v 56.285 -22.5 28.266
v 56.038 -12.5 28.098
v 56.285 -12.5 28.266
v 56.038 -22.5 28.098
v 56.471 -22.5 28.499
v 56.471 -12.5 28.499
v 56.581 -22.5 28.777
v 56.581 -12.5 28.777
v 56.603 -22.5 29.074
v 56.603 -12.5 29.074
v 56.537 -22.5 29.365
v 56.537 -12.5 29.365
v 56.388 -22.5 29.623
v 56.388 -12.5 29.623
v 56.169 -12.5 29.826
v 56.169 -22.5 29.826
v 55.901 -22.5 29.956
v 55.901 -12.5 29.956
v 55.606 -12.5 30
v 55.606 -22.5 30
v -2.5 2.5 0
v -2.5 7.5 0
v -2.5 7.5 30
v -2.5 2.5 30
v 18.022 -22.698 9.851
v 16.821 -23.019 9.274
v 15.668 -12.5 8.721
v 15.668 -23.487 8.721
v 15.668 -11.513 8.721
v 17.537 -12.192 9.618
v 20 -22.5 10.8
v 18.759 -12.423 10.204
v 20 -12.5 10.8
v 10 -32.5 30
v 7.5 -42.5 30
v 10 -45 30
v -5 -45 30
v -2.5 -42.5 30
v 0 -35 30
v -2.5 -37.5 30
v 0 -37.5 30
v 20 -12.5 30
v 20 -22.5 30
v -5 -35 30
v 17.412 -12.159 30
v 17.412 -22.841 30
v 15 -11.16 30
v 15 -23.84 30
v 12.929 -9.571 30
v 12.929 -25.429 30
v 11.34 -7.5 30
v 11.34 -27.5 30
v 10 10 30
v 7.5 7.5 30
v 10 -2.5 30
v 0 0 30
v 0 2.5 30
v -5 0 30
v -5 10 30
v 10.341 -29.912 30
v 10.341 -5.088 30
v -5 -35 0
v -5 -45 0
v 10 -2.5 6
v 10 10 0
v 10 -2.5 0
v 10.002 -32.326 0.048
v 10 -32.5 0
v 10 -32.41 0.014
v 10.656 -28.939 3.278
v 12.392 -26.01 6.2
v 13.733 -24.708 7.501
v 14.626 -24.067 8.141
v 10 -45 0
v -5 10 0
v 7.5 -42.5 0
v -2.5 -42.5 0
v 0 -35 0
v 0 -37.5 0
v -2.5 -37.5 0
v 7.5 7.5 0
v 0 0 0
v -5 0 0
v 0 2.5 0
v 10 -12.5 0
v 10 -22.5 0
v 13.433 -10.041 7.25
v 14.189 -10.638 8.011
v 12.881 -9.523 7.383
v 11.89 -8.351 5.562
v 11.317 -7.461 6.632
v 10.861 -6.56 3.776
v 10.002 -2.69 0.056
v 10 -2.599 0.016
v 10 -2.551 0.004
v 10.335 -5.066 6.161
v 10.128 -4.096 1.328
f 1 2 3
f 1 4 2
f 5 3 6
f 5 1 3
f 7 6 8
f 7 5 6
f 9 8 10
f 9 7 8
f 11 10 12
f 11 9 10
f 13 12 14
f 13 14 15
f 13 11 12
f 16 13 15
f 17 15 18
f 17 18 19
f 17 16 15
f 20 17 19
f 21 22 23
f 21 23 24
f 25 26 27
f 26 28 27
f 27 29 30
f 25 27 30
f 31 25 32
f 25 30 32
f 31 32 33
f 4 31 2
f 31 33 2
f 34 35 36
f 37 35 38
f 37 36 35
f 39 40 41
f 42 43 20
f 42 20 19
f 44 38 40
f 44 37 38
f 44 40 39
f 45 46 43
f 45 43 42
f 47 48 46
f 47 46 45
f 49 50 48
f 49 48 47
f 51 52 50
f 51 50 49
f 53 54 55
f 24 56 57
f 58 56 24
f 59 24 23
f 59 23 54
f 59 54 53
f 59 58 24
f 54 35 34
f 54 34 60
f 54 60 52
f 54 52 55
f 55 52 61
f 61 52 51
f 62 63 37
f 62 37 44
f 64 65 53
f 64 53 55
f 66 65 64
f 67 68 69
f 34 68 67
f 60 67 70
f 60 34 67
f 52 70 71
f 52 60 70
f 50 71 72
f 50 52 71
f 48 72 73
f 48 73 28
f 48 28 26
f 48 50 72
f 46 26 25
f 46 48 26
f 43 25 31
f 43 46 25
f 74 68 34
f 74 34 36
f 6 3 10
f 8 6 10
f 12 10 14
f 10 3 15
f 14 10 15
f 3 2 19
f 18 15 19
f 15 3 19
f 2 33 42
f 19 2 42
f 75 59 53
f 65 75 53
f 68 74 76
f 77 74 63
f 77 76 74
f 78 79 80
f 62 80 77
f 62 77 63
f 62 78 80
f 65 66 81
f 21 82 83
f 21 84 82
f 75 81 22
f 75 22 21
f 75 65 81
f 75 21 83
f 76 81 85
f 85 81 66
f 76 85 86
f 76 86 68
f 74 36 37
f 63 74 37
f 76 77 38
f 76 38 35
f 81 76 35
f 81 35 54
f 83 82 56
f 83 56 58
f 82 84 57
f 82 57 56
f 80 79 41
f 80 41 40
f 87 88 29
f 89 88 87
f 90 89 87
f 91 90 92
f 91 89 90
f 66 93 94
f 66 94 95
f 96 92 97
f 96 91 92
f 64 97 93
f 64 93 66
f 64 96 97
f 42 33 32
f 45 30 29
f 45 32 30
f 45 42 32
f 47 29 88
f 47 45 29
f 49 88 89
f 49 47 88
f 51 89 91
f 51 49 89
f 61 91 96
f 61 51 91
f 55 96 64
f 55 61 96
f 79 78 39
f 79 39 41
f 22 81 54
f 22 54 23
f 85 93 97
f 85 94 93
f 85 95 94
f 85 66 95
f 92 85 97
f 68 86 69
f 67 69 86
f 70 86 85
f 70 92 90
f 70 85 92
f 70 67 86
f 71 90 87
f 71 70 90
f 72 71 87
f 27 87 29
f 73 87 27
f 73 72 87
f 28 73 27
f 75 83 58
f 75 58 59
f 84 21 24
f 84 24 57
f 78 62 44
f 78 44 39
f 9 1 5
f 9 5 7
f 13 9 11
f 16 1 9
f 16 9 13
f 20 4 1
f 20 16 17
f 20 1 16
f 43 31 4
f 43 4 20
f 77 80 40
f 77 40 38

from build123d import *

# Parameters (mm, degrees)
BOSS_EXTRUDE1_DEPTH      = 30
BOSS_EXTRUDE2_DEPTH      = 5
BOSS_EXTRUDE2_DEPTH_BACK = 5
FILLET1_R                = 10
FILLET2_R                = 1


with BuildPart() as part:
    # Sketch2 → Boss-Extrude1 (new body)
    with BuildSketch(Plane.XY):
        Polygon((0, 0), (-5, 0), (-5, 10), (10, 10), (10, -45), (-5, -45), (-5, -35), (0, -35), (0, -37.5), (-2.5, -37.5), (-2.5, -42.5), (7.5, -42.5), (7.5, 7.5), (-2.5, 7.5), (-2.5, 2.5), (0, 2.5), align=None)
    extrude(amount=BOSS_EXTRUDE1_DEPTH)

    # Sketch3 → Boss-Extrude2 (add, two sides: drawn at the far end of the back side and taken through both)
    with BuildSketch(Plane(origin=(0, -17.5, 0), x_dir=(-1, 0, 0), z_dir=(0, -1, 0)).offset(-BOSS_EXTRUDE2_DEPTH_BACK)):
        Polygon((-10, -6), (-60, -30), (-10, -30), align=None)
    extrude(amount=BOSS_EXTRUDE2_DEPTH + BOSS_EXTRUDE2_DEPTH_BACK)

    # Fillet1
    # the kernel refuses this fillet: 10 mm, written as the material it adds along each edge
    with BuildSketch(Plane(origin=(10, -22.5, 6), x_dir=(0, 0, -1), z_dir=(0, 1, 0))) as fillet1_piece_1:
        with BuildLine():
            CenterArc((6.294420553, -9.995664887), FILLET1_R, 91.687149317, 62.671844859)
            Line((-2.720810021, -5.668354211), (0, 0))
            Line((0, 0), (6, 0))
        make_face()
    extrude(amount=10)
    with BuildSketch(Plane(origin=(10, -12.5, 30), x_dir=(0, 1, 0), z_dir=(0, 0, -1))) as fillet1_piece_2_section:
        with BuildLine():
            CenterArc((FILLET1_R, FILLET1_R), FILLET1_R, 180, 90)
            Line((0, FILLET1_R), (0, 0))
            Line((0, 0), (FILLET1_R, 0))
        make_face()
    fillet1_piece_2 = extrude(amount=49, mode=Mode.PRIVATE)
    fillet1_piece_2 = split(fillet1_piece_2, bisect_by=Plane(origin=(19.362808843, -12.5, 10.494148244), z_dir=(-0.4327310675847713, 0, 0.9015230574682737)), keep=Keep.TOP, mode=Mode.PRIVATE)
    add(fillet1_piece_2)
    with BuildSketch(Plane(origin=(10, -22.5, 30), x_dir=(0, -1, 0), z_dir=(0, 0, -1))) as fillet1_piece_3_section:
        with BuildLine():
            CenterArc((FILLET1_R, -FILLET1_R), FILLET1_R, 90, 90)
            Line((0, -FILLET1_R), (0, 0))
            Line((0, 0), (FILLET1_R, 0))
        make_face()
    fillet1_piece_3 = extrude(amount=49, mode=Mode.PRIVATE)
    fillet1_piece_3 = split(fillet1_piece_3, bisect_by=Plane(origin=(19.362808843, -22.5, 10.494148244), z_dir=(-0.4327310675847713, 0, 0.9015230574682737)), keep=Keep.TOP, mode=Mode.PRIVATE)
    add(fillet1_piece_3)
    with BuildSketch(Plane(origin=(10, -22.5, 30), x_dir=(0, -1, 0), z_dir=(0, 0, -1))) as fillet1_piece_4a_section:
        with BuildLine():
            CenterArc((FILLET1_R, -FILLET1_R), FILLET1_R, 90, 90)
            Line((0, -FILLET1_R), (0, 0))
            Line((0, 0), (FILLET1_R, 0))
        make_face()
    fillet1_piece_4a = extrude(amount=49, mode=Mode.PRIVATE)
    fillet1_piece_4a = split(fillet1_piece_4a, bisect_by=Plane(origin=(10, -22.5, 0), z_dir=(0, 0, 1)), keep=Keep.TOP, mode=Mode.PRIVATE)
    fillet1_piece_4a = split(fillet1_piece_4a, bisect_by=Plane(origin=(19.362808843, -22.5, 10.494148244), z_dir=(0.4327310675847713, 0, -0.9015230574682737)), keep=Keep.TOP, mode=Mode.PRIVATE)
    with BuildSketch(Plane(origin=(10, -38.218827612, 6), x_dir=(0, 0, -1), z_dir=(0, 1, 0))) as fillet1_piece_4b_section:
        with BuildLine():
            CenterArc((6.294420553, -9.995664887), FILLET1_R, 91.687149317, 62.671844859)
            Line((-2.720810021, -5.668354211), (0, 0))
            Line((0, 0), (6, 0))
        make_face()
    fillet1_piece_4b = extrude(amount=25.718827612, mode=Mode.PRIVATE)
    fillet1_piece_4b = split(fillet1_piece_4b, bisect_by=Plane(origin=(10, -22.5, 6), z_dir=(0, -1, 0)), keep=Keep.TOP, mode=Mode.PRIVATE)
    fillet1_piece_4 = fillet1_piece_4a & fillet1_piece_4b
    add(fillet1_piece_4)
    with BuildSketch(Plane(origin=(10, -22.5, 6), x_dir=(0, 0, -1), z_dir=(0, 1, 0))) as fillet1_piece_5a_section:
        with BuildLine():
            CenterArc((6.294420553, -9.995664887), FILLET1_R, 91.687149317, 62.671844859)
            Line((-2.720810021, -5.668354211), (0, 0))
            Line((0, 0), (6, 0))
        make_face()
    fillet1_piece_5a = extrude(amount=25.718827612, mode=Mode.PRIVATE)
    fillet1_piece_5a = split(fillet1_piece_5a, bisect_by=Plane(origin=(10, -12.5, 6), z_dir=(0, 1, 0)), keep=Keep.TOP, mode=Mode.PRIVATE)
    with BuildSketch(Plane(origin=(10, -12.5, 30), x_dir=(0, 1, 0), z_dir=(0, 0, -1))) as fillet1_piece_5b_section:
        with BuildLine():
            CenterArc((FILLET1_R, FILLET1_R), FILLET1_R, 180, 90)
            Line((0, FILLET1_R), (0, 0))
            Line((0, 0), (FILLET1_R, 0))
        make_face()
    fillet1_piece_5b = extrude(amount=49, mode=Mode.PRIVATE)
    fillet1_piece_5b = split(fillet1_piece_5b, bisect_by=Plane(origin=(10, -12.5, 0), z_dir=(0, 0, 1)), keep=Keep.TOP, mode=Mode.PRIVATE)
    fillet1_piece_5b = split(fillet1_piece_5b, bisect_by=Plane(origin=(19.362808843, -12.5, 10.494148244), z_dir=(0.4327310675847713, 0, -0.9015230574682737)), keep=Keep.TOP, mode=Mode.PRIVATE)
    fillet1_piece_5 = fillet1_piece_5a & fillet1_piece_5b
    add(fillet1_piece_5)

    # Fillet2
    fillet2_edges = [part.edges().sort_by_distance(p)[0] for p in [
        (60, -17.5, 30),
    ]]
    fillet(fillet2_edges, radius=FILLET2_R)


solid = part.part
